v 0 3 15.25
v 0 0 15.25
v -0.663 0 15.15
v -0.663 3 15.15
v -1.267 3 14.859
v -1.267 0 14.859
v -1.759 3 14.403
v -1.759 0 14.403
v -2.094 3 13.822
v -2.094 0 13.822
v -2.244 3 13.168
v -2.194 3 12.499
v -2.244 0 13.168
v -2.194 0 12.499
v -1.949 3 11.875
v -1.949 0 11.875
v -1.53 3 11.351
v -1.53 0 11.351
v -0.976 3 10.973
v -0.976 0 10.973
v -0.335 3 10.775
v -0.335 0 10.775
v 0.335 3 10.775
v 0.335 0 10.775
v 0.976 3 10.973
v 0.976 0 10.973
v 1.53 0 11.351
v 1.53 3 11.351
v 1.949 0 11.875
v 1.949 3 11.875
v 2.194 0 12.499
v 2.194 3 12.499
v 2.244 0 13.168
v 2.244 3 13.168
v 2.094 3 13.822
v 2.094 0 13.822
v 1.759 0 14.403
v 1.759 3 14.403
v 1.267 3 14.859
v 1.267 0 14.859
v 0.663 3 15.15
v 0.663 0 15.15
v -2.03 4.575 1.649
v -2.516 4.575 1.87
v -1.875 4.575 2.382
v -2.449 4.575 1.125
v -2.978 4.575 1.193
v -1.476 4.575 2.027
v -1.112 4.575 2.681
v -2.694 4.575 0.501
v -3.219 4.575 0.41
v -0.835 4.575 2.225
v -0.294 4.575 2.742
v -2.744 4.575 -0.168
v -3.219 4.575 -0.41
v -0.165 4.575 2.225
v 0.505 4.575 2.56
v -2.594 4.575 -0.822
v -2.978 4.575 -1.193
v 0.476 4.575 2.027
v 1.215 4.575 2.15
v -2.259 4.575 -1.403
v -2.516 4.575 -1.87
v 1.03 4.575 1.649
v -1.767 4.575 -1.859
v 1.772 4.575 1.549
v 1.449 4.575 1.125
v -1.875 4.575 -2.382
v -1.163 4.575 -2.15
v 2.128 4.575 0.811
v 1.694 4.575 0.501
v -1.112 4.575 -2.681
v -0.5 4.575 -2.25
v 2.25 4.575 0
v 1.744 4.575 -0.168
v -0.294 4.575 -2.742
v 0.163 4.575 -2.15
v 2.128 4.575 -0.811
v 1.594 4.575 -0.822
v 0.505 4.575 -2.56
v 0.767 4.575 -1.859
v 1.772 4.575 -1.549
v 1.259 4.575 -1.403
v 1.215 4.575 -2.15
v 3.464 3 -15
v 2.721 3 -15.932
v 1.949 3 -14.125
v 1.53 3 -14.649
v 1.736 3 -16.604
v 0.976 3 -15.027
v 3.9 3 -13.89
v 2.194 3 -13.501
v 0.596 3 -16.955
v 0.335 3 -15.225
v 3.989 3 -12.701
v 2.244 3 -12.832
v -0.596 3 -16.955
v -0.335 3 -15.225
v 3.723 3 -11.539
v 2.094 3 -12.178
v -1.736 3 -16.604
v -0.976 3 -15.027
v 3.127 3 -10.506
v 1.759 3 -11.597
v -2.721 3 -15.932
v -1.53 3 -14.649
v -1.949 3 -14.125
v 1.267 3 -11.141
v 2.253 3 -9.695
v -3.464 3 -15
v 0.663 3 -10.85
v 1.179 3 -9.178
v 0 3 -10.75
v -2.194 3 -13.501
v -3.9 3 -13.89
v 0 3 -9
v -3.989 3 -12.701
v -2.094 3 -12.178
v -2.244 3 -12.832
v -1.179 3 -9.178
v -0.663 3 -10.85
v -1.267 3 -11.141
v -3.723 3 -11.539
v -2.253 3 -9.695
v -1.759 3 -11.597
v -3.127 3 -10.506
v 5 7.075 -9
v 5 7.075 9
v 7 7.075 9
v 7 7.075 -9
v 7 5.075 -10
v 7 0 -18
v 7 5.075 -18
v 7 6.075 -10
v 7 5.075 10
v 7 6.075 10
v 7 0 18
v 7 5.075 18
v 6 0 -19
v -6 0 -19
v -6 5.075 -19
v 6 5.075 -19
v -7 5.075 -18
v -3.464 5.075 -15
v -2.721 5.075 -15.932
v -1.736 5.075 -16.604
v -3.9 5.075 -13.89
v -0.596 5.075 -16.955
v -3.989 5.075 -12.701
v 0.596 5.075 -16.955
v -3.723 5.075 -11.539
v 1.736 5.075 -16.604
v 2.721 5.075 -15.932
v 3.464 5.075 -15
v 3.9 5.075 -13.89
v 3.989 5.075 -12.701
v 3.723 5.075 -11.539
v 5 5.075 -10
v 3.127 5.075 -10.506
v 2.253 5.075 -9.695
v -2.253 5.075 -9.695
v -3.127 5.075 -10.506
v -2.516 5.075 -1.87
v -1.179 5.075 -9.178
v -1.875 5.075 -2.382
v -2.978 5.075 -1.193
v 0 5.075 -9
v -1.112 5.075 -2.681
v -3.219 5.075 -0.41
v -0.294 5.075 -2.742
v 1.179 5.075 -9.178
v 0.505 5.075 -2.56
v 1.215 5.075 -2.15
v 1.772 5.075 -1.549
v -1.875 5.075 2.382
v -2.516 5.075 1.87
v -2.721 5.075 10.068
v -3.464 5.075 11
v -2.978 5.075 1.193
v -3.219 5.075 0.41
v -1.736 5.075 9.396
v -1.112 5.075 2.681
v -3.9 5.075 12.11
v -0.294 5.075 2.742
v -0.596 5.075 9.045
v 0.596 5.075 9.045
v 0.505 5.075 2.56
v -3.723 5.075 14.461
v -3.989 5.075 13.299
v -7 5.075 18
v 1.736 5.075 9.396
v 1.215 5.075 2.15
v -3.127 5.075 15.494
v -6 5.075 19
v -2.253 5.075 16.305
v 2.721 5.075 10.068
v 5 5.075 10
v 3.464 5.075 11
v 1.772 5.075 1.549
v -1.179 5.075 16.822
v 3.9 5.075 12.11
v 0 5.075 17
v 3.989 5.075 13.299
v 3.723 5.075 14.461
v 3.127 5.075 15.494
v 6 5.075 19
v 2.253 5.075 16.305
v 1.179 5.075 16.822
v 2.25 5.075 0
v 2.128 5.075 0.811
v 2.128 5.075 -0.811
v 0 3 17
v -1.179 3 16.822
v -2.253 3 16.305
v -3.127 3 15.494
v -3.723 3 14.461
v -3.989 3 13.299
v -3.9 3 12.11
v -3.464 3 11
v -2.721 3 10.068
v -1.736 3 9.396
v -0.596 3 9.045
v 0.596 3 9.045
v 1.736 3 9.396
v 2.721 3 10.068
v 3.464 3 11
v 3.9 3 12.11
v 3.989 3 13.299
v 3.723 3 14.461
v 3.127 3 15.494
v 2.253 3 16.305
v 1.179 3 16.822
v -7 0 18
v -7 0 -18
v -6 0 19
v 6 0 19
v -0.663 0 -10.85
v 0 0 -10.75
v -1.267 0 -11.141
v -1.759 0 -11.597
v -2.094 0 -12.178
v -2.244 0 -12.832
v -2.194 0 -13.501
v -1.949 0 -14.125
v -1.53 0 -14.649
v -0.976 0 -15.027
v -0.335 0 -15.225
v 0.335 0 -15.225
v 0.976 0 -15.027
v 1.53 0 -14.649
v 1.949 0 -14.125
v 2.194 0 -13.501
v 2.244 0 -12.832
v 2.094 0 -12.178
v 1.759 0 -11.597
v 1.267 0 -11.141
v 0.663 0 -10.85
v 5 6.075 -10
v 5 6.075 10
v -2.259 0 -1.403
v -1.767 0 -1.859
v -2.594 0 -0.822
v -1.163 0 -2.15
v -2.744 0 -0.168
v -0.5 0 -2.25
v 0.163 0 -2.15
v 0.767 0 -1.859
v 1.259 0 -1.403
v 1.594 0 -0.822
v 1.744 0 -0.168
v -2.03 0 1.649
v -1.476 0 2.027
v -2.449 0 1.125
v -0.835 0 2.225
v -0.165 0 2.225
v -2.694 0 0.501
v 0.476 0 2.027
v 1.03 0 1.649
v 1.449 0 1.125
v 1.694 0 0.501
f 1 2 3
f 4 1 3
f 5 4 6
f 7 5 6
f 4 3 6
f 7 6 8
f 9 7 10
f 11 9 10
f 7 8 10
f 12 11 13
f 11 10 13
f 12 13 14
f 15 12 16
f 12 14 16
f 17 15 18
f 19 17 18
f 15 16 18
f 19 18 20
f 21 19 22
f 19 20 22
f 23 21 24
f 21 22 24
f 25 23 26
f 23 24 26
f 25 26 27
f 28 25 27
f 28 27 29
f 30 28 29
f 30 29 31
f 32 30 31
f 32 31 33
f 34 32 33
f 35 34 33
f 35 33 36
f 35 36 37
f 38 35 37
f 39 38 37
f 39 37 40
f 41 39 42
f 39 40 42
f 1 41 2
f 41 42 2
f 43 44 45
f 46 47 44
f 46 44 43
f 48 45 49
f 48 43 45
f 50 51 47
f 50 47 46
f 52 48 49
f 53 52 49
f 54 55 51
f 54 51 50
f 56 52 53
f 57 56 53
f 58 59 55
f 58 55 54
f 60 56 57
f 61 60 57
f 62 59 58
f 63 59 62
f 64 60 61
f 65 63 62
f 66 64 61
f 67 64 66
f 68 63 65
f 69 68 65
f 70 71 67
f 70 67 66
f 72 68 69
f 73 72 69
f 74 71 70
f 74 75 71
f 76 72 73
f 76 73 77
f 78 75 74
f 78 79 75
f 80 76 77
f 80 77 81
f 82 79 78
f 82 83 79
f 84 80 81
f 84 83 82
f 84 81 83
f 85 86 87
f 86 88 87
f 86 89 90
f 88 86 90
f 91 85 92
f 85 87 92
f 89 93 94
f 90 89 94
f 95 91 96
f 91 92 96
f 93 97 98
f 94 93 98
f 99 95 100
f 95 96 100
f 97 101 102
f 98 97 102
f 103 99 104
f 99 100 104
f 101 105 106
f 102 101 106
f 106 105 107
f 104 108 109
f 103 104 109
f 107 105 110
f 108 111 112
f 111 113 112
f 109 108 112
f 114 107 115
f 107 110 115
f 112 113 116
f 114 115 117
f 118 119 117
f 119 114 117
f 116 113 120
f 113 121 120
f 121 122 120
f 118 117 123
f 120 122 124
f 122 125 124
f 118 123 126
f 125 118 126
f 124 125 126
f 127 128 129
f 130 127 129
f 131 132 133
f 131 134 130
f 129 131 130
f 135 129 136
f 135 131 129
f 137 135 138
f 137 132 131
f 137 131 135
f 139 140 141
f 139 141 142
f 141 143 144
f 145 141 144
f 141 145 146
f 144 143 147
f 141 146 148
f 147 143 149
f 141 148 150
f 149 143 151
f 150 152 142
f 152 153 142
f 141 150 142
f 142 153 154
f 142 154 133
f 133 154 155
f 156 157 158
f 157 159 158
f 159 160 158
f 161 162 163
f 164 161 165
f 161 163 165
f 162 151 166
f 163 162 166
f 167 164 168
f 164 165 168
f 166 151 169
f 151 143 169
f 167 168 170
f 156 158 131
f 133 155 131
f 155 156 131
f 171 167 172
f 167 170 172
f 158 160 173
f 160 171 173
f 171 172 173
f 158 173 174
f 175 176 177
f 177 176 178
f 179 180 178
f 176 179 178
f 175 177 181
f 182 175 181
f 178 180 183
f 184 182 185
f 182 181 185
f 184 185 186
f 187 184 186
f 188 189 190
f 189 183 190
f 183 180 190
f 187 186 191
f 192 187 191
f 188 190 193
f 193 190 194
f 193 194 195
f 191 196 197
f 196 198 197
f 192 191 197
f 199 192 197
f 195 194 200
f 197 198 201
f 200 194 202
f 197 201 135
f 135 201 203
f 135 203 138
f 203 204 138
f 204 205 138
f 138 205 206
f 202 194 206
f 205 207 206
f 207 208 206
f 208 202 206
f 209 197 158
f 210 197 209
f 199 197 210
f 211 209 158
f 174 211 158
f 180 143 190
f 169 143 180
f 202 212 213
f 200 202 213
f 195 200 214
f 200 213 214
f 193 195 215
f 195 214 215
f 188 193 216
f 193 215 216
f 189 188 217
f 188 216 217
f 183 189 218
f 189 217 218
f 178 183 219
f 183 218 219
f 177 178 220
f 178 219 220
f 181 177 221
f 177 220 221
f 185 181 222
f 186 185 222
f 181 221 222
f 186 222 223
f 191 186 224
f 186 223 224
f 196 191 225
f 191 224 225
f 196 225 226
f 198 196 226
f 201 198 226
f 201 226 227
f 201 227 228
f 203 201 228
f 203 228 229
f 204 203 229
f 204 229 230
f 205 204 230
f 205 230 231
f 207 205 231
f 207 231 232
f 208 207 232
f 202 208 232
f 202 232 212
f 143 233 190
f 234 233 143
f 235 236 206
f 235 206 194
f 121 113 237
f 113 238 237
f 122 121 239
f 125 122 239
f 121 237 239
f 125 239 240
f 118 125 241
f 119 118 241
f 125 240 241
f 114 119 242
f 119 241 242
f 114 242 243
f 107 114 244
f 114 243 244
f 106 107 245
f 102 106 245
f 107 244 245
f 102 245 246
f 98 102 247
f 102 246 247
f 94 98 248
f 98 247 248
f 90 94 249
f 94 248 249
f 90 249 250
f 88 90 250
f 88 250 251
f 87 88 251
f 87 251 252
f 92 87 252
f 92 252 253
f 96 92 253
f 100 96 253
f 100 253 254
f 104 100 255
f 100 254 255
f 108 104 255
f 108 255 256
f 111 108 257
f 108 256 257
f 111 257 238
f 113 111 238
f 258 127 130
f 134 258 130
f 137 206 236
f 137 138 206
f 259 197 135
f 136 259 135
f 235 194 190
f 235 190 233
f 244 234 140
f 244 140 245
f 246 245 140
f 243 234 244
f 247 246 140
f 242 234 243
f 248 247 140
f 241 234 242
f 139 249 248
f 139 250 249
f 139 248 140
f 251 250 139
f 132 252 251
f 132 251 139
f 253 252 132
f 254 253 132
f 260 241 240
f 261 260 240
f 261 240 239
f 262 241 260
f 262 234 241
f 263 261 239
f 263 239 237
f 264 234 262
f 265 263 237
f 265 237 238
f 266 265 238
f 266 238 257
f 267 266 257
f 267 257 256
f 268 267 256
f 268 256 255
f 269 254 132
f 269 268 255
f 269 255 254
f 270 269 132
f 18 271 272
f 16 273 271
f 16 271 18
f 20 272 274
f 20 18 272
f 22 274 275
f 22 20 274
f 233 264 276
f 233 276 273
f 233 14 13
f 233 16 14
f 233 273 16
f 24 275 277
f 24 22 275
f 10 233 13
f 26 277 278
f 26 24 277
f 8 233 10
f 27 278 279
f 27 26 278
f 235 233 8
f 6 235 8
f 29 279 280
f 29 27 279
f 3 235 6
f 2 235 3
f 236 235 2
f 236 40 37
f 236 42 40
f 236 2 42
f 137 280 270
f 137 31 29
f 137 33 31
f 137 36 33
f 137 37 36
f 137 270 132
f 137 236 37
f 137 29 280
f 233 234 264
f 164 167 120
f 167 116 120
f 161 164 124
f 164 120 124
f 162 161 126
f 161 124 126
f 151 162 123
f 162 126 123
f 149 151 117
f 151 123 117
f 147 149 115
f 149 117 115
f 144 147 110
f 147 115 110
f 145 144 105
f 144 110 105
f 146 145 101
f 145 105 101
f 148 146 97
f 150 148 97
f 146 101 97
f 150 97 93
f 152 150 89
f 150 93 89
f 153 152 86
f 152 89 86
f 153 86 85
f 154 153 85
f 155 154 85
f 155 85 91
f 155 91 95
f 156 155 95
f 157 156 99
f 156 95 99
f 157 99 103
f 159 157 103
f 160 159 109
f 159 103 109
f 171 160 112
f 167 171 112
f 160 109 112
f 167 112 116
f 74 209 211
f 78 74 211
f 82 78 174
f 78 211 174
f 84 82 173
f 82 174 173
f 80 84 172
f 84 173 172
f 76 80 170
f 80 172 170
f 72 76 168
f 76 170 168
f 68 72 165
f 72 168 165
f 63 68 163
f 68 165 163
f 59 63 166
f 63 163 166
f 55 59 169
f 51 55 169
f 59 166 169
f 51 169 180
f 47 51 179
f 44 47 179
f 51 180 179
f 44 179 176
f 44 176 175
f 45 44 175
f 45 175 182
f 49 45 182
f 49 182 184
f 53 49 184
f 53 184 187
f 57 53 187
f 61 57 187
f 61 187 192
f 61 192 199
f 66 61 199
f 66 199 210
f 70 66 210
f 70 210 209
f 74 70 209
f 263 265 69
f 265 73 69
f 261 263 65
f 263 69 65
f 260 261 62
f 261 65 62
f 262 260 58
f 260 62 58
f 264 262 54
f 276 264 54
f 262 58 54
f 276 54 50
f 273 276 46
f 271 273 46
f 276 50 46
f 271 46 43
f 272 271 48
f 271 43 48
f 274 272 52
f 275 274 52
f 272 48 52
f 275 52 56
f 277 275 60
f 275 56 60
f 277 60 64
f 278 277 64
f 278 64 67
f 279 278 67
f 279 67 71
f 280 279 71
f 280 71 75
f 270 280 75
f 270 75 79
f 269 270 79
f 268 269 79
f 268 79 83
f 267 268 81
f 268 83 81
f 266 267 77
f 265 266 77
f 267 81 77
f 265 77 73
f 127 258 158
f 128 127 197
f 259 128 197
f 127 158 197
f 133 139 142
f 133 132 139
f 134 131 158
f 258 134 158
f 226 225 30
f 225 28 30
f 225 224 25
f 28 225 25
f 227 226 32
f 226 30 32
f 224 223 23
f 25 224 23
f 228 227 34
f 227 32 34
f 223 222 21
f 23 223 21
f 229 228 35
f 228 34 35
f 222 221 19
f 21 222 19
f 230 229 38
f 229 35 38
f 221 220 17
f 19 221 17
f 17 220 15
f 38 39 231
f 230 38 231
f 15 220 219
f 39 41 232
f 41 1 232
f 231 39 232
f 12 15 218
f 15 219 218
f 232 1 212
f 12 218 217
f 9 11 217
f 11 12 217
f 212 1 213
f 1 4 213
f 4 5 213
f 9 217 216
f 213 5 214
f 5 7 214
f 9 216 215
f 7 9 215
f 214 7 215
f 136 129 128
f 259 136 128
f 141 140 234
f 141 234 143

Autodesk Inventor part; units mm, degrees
ref_plane "YZ Plane" through (0, 0, 0) normal (1, 0, 0) x (0, 1, 0)
ref_plane "XZ Plane" through (0, 0, 0) normal (0, 1, 0) x (-1, 0, 0)
ref_plane "XY Plane" through (0, 0, 0) normal (0, 0, 1) x (1, 0, 0)
sketch "Sketch1" plane through (0, 0, 0) normal (0, 1, 0) x (-1, 0, 0)
  line L0 (7, 10) -> (-7, 10)
  line L1 (-7, 10) -> (-7, -10)
  line L2 (-7, -10) -> (7, -10)
  line L3 (7, -10) -> (7, 10)
  line L4 (7, 10) -> (-7, -10) construction
  line L5 (-7, 10) -> (7, -10) construction
  point P0 (0, 0)
  dimension "POST_WIDTH" = 20
  dimension "POST_LENGTH" = 14
extrude "Extrusion1" add sketch "Sketch1" along normal blind 5.075
sketch "Sketch2" plane through (0, 0, 0) normal (0, -1, 0) x (1, 0, 0)
  line L0 (-7, -19) -> (7, -19)
  line L1 (7, -19) -> (7, 19)
  line L2 (7, 19) -> (-7, 19)
  line L3 (-7, 19) -> (-7, -19)
  line L4 (-7, -19) -> (7, 19) construction
  line L5 (7, -19) -> (-7, 19) construction
  line L6 (-7, -10) -> (-7, 10) projected
  line L7 (-7, 10) -> (7, 10) projected
  point P0 (0, 0)
  dimension "d4" = 0
  dimension "WING_LENGTH" = 9
extrude "Extrusion2" add sketch "Sketch2" against normal blind 5.075
sketch "Sketch3" plane through (0, 5.075, 0) normal (0, 1, 0) x (1, 0, 0)
  line L0 (-7, 19) -> (7, 19) projected
  line L1 (0, 19) -> (0, -19)
  line L2 (7, -19) -> (-7, -19) projected
  line L3 (7, 0) -> (-7, 0)
  line L4 (-7, -19) -> (-7, 19) projected
  point P0 (0, 0)
  point P1 (0, -13)
  point P2 (0, 13)
  dimension "d15" = 0
  dimension "d16" = 6
hole "Hole1" at (0, 5.075, 13) at (0, 5.075, -13) direction (0, -1, 0) diameter 4.5 end through all counterbore diameter 8 counterbore depth 2.075 clearance for "Socket Head Cap Screw" size "#8" standard "Ansi Unified Screw Threads"
chamfer "Chamfer4" distance 1 angle 45 4 edges at (-7, 2.5375, 19) (7, 2.5375, 19) (-7, 2.5375, -19) (7, 2.5375, -19)
sketch "Sketch4" plane through (0, 5.075, 0) normal (0, 1, 0) x (1, 0, 0)
  line L0 (7, 10) -> (5, 10)
  line L1 (5, 10) -> (5, -10)
  line L2 (5, -10) -> (7, -10)
  line L3 (7, -10) -> (7, 10)
  line L4 (7, -18) -> (7, 18) projected
  point P0 (0, 0)
  dimension "d56" = 20
  dimension "d57" = 2
  dimension "d58" = 0
  dimension "d59" = 10
extrude "Extrusion3" add sketch "Sketch4" along normal blind 2
sketch "Sketch5" plane through (0, 0, 0) normal (0, -1, 0) x (1, 0, 0)
  line L0 (-9.8, 0) -> (9.8, 0) projected
  line L1 (0, 26.6) -> (0, -26.6) projected
  line L2 (-7, 19) -> (-7, -19) projected
  line L3 (7, -10) -> (7, -18) projected
  line L4 (6, -19) -> (7, -18) projected
  line L5 (6, -19) -> (-6, -19) projected
  line L6 (-7, -18) -> (-6, -19) projected
  line L7 (-7, -18) -> (-7, 18) projected
  line L8 (-6, 19) -> (-7, 18) projected
  line L9 (-6, 19) -> (6, 19) projected
  line L10 (7, 18) -> (6, 19) projected
  line L11 (5, -10) -> (7, -10) projected
  line L12 (7, 18) -> (7, 10) projected
  line L13 (7, 10) -> (5, 10) projected
  line L14 (5, 10) -> (5, -10) projected
  point P0 (-0.5, 0)
hole "Hole2" at (-0.5, 0, 0) direction (0, 1, 0) diameter 4.5 end through all clearance for "Socket Head Cap Screw" size "#8" standard "Ansi Unified Screw Threads"
chamfer "Chamfer1" distance 1 angle 45 2 edges at (6, 7.075, -10) (6, 7.075, 10)
chamfer "Chamfer2" [suppressed]
sketch "Sketch7" plane through (0, 5.075, 0) normal (0, 1, 0) x (1, 0, 0)
  circle A0 centre (-0.5, 0) radius 2.75
  circle A1 centre (-0.5, 0) radius 2.25 projected
  point P0 (0, 0)
  dimension "d46" = 5.5
extrude "Extrusion5" cut sketch "Sketch7" against normal blind 0.5 contours A0 | A1
equation "\"POST_LENGTH\" = 2 * LIP_THICKNESS + BASE_THICKNESS"
equation "\"POST_HEIGHT\" = BEAM_HEIGHT - BASE2APERTURE_CENTER"
equation "\"BASE2APERTURE_CENTER\" = 13.975"
equation "\"BEAM_HEIGHT\" = 19.05"
equation "\"WALL_GAP\" = 0.5"
equation "\"LIP_THICKNESS\" = 2"
equation "\"BASE_THICKNESS\" = 10"
properties part number "ADAPTER_RSP05-BH19.05"
